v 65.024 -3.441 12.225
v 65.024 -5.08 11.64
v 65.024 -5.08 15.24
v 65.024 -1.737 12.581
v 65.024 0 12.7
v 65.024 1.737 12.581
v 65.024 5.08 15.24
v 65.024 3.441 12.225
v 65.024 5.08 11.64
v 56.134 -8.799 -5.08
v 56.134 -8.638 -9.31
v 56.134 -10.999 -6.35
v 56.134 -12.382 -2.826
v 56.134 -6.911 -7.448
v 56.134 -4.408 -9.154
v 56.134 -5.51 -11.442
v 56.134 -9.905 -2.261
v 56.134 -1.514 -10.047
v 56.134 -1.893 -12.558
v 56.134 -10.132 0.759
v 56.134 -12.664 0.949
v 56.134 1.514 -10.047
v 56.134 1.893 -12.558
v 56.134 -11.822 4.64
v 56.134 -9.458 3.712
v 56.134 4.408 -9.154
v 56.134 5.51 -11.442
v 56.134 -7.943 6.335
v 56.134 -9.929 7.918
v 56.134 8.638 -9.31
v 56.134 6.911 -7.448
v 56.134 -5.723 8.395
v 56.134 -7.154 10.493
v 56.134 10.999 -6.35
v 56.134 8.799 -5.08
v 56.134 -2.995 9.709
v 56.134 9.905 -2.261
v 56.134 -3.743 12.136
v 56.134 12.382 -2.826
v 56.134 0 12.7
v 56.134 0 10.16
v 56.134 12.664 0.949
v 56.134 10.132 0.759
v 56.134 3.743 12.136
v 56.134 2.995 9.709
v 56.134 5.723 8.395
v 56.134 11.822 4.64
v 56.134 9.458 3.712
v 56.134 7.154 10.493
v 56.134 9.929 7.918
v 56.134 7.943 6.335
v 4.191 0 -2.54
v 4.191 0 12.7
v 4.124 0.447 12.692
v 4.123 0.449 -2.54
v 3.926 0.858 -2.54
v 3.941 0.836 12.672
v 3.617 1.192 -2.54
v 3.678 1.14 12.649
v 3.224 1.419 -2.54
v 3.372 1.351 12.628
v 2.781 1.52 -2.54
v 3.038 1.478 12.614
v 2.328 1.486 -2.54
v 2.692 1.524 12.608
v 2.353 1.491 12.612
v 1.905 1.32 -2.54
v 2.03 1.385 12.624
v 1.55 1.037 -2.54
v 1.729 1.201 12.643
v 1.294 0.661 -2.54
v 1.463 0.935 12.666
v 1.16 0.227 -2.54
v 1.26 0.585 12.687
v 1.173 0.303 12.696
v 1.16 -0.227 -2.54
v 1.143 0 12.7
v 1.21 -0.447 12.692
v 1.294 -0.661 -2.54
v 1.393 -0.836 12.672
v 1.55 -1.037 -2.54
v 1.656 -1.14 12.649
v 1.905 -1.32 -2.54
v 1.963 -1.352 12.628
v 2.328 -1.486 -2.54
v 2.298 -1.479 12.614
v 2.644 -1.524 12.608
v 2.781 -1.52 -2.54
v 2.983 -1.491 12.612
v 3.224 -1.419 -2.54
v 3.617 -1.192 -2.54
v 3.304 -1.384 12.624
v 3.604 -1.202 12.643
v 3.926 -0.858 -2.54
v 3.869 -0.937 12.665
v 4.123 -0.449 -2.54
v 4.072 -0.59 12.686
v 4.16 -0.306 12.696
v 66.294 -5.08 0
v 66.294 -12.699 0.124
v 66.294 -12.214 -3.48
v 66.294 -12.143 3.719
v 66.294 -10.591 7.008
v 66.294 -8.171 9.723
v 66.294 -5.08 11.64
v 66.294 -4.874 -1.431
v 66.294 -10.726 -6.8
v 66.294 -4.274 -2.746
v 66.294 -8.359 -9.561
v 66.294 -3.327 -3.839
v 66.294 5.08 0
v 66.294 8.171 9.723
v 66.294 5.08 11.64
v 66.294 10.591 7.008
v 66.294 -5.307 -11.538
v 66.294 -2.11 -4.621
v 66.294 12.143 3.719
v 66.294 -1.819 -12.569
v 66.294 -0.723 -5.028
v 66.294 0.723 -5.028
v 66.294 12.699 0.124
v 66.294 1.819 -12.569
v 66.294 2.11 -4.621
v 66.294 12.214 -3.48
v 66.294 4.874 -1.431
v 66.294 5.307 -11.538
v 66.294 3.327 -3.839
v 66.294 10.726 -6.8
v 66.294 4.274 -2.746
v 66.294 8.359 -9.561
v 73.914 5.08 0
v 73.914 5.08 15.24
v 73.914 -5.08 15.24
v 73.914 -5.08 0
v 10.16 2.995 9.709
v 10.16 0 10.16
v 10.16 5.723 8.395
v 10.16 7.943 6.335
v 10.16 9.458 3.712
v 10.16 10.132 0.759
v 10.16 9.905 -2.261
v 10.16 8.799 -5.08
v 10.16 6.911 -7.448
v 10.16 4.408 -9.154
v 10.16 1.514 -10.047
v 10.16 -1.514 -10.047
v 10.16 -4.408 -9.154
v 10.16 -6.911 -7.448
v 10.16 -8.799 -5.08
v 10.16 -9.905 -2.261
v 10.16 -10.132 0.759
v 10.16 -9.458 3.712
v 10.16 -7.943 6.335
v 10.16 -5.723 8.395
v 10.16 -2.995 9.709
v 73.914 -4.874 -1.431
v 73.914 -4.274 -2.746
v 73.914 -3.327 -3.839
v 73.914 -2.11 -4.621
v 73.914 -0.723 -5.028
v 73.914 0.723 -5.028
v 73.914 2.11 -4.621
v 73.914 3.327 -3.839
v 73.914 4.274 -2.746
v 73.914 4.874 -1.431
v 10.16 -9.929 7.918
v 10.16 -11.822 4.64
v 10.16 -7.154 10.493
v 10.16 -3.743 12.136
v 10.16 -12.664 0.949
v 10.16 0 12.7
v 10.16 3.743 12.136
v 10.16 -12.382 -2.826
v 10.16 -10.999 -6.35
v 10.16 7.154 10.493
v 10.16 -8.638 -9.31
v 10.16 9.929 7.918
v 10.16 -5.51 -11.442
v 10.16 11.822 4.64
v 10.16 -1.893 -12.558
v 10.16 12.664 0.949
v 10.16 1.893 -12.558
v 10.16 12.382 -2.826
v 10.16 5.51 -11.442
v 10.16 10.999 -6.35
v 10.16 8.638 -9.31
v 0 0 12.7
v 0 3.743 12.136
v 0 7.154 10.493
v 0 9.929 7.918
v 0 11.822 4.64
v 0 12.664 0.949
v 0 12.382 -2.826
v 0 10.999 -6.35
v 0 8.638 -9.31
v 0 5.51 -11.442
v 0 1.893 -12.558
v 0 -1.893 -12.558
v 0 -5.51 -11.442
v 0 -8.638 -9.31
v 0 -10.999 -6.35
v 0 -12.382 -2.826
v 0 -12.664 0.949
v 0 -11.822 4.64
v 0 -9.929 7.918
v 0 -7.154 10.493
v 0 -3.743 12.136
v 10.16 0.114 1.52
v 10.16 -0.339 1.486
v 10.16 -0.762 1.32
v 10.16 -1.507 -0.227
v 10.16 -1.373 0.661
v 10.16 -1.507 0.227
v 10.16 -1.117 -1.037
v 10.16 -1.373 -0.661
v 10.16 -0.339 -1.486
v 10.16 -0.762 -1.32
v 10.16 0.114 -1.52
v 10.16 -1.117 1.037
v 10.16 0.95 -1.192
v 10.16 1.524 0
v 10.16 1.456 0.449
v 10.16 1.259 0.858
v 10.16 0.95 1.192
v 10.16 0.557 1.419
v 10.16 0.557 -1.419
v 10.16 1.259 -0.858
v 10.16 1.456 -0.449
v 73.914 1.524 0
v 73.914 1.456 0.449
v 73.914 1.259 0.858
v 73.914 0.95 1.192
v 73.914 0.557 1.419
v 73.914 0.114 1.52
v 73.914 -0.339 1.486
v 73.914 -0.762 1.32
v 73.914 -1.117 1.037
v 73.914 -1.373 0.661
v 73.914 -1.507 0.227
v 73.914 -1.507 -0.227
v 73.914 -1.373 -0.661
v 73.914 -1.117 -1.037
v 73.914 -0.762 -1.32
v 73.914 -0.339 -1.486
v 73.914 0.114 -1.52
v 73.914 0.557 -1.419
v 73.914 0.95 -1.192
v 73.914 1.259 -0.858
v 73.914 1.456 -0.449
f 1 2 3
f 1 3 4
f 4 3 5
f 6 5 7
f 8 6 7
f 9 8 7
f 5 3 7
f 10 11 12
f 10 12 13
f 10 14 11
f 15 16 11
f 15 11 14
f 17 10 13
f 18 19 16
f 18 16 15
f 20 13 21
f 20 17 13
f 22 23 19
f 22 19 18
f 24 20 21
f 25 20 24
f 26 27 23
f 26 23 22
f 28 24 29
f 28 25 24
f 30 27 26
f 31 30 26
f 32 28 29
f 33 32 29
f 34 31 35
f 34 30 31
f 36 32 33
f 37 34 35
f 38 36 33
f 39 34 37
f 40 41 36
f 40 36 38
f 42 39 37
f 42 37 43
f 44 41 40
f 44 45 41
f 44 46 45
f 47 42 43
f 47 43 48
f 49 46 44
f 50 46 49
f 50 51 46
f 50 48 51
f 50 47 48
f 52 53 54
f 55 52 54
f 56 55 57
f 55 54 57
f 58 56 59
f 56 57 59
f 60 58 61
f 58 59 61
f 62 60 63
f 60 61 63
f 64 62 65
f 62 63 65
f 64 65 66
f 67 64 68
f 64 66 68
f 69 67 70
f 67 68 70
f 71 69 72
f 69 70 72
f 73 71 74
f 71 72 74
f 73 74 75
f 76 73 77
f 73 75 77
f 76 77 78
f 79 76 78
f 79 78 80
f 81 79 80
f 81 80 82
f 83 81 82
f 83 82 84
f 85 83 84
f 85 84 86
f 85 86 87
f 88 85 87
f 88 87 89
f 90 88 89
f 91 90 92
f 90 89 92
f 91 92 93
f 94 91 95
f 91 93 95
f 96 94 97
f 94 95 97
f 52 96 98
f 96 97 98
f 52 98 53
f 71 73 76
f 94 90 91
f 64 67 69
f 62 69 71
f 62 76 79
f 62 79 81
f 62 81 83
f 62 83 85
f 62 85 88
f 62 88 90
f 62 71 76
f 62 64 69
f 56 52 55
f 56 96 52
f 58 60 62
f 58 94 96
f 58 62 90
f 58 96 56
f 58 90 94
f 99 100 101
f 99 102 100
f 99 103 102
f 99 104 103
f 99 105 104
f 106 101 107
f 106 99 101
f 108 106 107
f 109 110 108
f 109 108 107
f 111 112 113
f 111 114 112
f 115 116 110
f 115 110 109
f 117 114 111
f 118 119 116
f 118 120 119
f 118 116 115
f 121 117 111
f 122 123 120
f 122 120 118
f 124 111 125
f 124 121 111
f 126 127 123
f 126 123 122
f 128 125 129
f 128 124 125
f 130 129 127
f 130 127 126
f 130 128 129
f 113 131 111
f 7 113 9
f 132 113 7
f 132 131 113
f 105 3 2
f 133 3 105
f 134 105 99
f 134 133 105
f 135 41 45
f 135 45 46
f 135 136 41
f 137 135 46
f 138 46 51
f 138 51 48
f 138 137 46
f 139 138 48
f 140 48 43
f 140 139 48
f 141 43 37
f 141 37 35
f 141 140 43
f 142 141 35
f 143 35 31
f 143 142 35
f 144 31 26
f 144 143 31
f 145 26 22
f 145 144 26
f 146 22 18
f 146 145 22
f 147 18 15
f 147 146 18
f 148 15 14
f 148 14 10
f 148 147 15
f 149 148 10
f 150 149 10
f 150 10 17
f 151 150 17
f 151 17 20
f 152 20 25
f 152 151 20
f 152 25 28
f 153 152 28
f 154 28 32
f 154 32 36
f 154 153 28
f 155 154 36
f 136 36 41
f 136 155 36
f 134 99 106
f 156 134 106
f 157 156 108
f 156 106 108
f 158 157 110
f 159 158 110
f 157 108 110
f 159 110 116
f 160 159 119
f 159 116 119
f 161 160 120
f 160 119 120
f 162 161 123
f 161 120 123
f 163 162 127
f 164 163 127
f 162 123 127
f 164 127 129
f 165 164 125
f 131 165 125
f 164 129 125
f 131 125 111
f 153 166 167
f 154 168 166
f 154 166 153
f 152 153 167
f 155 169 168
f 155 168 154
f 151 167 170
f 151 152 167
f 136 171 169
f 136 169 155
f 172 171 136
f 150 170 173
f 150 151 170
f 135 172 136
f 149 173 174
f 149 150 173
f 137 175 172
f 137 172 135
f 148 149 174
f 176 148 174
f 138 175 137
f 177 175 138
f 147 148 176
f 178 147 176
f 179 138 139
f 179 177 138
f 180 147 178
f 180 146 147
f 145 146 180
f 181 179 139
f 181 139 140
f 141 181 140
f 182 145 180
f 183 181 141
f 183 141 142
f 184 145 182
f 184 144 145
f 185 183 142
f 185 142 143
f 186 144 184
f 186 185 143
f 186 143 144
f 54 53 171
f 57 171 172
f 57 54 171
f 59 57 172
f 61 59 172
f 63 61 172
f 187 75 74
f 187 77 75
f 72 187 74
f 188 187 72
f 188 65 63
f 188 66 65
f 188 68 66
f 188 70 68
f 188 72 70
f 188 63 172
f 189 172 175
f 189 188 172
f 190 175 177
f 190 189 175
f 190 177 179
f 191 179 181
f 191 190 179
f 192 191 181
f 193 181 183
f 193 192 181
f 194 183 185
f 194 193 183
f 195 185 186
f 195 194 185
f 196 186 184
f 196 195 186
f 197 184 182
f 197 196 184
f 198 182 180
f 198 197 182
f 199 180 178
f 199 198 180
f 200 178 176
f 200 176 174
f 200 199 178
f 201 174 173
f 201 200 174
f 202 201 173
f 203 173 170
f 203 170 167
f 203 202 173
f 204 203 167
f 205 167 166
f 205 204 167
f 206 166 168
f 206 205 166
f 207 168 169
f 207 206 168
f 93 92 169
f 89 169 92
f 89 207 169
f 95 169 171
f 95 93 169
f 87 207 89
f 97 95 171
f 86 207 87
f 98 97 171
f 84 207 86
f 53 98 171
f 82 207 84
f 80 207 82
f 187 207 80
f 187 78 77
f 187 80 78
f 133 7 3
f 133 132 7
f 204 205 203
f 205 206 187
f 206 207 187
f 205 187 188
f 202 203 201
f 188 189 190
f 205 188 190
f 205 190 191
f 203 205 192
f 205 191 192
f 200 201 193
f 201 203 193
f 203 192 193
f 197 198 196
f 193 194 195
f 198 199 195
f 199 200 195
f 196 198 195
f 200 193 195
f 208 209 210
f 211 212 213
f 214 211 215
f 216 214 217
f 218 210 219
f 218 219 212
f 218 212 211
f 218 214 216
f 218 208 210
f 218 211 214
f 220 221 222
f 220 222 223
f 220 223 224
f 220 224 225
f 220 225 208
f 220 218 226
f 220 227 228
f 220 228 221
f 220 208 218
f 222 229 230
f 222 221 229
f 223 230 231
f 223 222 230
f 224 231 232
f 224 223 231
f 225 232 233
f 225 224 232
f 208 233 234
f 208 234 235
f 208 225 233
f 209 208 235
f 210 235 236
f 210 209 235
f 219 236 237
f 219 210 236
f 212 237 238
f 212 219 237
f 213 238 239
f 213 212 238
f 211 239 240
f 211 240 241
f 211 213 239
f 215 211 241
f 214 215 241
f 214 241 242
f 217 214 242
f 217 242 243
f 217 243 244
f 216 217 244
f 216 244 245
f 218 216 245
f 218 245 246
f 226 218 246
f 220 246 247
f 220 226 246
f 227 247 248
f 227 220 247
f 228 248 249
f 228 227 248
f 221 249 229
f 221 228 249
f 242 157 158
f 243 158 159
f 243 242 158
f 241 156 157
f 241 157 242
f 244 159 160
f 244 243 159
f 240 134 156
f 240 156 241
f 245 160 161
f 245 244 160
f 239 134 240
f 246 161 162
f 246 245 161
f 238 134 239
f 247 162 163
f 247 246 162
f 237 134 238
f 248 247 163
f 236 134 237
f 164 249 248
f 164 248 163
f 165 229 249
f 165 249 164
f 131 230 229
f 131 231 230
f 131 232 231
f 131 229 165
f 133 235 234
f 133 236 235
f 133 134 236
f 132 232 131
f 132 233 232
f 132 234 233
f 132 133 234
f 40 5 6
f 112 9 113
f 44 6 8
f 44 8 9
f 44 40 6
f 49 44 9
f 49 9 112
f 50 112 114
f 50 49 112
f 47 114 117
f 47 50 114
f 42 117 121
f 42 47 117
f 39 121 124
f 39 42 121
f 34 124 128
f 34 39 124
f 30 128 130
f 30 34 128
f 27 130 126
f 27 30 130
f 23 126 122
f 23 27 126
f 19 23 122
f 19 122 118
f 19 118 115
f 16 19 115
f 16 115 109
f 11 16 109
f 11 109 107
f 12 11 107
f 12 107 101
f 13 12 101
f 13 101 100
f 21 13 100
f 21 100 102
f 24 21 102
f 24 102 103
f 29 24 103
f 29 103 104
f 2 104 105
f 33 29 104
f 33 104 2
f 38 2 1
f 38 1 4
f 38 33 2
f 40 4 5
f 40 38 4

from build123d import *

# Parameters (mm, degrees)
F0_W          = 5.842
F0_H          = 12.7
F0_R          = 3.175
F2_DEPTH      = 3.175
F3_R          = 1.524
F4_DEPTH      = 7.62
F4_DEPTH_BACK = 1.27
F5_DEPTH      = 56.134
F6_R          = 1.524
F7_DEPTH      = 17.78


with BuildPart() as f1:
    # F0 (on Front) → F1 (revolve)
    with BuildSketch(Plane.XZ):
        Polygon((5.842, 12.7), (5.842, 0), (66.294, 0), (66.294, 12.7), (56.134, 12.7), (56.134, 10.16), (10.16, 10.16), (10.16, 12.7), align=None)
        with Locations((2.921, 6.35)):
            Rectangle(F0_W, F0_H)
    revolve(axis=Axis((33.147, 0, 0), (-1, 0, 0)))

    # F3 (on face) → F4 (join, two sides)
    with BuildSketch(Plane.YZ.offset(66.294)) as f4_sk:
        with BuildLine():
            ThreePointArc((-5.08, 11.6397422652), (0, 12.7), (5.08, 11.6397422652))
            Line((5.08, 11.6397422652), (5.08, 15.24))
            Line((5.08, 15.24), (-5.08, 15.24))
            Line((-5.08, 15.24), (-5.08, 11.6397422652))
        make_face()
        with BuildLine():
            ThreePointArc((-5.08, 0), (0, 5.08), (5.08, 0))
            Line((5.08, 0), (5.08, 11.6397422652))
            ThreePointArc((5.08, 11.6397422652), (0, 12.7), (-5.08, 11.6397422652))
            Line((-5.08, 11.6397422652), (-5.08, 0))
        make_face()
        with BuildLine():
            ThreePointArc((-5.08, 0), (0, -5.08), (5.08, 0))
            ThreePointArc((5.08, 0), (0, 5.08), (-5.08, 0))
        make_face()
        Circle(F3_R, mode=Mode.SUBTRACT)
    extrude(amount=F4_DEPTH)
    extrude(f4_sk.sketch, amount=-F4_DEPTH_BACK)

    # F5 (cut, through all): a face of the model
    f5_faces = [f1.faces().sort_by_distance(p)[0] for p in [
        (66.294, 0, 0),
    ]]
    extrude(f5_faces, amount=-F5_DEPTH, mode=Mode.SUBTRACT)


with BuildPart() as f2:
    # F0 (on Front) → F2 (new body, symmetric)
    with BuildSketch(Plane.XZ):
        with BuildLine():
            Line((-0.9398, 0), (0, 0))
            Line((0, 0), (0, 12.7))
            Line((0, 12.7), (5.842, 12.7))
            Line((5.842, 12.7), (5.842, 15.24))
            Line((5.842, 15.24), (-0.508, 15.24))
            Line((-0.508, 15.24), (-10.8806298187, 3.8475430269))
            ThreePointArc((-10.8806298187, 3.8475430269), (-4.5919612295, 5.3297205562), (-0.9398, 0))
        make_face()
        with BuildLine():
            ThreePointArc((-8.1826630726, -5.5069827884), (-3.1957909266, -4.5493385486), (-0.9398, 0))
            ThreePointArc((-0.9398, 0), (-4.5919612295, 5.3297205562), (-10.8806298187, 3.8475430269))
            ThreePointArc((-10.8806298187, 3.8475430269), (-12.1459778134, -1.5837270034), (-8.1826630726, -5.5069827884))
        make_face()
        with Locations((-6.6548, 0)):
            Circle(F0_R, mode=Mode.SUBTRACT)
        with BuildLine():
            Line((5.842, 0), (0, 0))
            Line((0, 0), (-0.9398, 0))
            ThreePointArc((-0.9398, 0), (-3.1957909266, -4.5493385486), (-8.1826630726, -5.5069827884))
            Line((-8.1826630726, -5.5069827884), (5.842, -9.398))
            Line((5.842, -9.398), (5.842, 0))
        make_face()
    extrude(amount=F2_DEPTH, both=True)


with BuildPart() as f7_tool:
    # F6 (on face) → F7 (new body)
    with BuildSketch(Plane.XY.offset(15.24)):
        with Locations((2.667, 0)):
            Circle(F6_R)
    extrude(amount=-F7_DEPTH)


with BuildPart() as f1_1:
    add(f1.part)

    # F7: cut by f7_tool
    add(f7_tool.part, mode=Mode.SUBTRACT)


with BuildPart() as f2_1:
    add(f2.part)

    # F7: cut by f7_tool
    add(f7_tool.part, mode=Mode.SUBTRACT)


solid = f1_1.part
